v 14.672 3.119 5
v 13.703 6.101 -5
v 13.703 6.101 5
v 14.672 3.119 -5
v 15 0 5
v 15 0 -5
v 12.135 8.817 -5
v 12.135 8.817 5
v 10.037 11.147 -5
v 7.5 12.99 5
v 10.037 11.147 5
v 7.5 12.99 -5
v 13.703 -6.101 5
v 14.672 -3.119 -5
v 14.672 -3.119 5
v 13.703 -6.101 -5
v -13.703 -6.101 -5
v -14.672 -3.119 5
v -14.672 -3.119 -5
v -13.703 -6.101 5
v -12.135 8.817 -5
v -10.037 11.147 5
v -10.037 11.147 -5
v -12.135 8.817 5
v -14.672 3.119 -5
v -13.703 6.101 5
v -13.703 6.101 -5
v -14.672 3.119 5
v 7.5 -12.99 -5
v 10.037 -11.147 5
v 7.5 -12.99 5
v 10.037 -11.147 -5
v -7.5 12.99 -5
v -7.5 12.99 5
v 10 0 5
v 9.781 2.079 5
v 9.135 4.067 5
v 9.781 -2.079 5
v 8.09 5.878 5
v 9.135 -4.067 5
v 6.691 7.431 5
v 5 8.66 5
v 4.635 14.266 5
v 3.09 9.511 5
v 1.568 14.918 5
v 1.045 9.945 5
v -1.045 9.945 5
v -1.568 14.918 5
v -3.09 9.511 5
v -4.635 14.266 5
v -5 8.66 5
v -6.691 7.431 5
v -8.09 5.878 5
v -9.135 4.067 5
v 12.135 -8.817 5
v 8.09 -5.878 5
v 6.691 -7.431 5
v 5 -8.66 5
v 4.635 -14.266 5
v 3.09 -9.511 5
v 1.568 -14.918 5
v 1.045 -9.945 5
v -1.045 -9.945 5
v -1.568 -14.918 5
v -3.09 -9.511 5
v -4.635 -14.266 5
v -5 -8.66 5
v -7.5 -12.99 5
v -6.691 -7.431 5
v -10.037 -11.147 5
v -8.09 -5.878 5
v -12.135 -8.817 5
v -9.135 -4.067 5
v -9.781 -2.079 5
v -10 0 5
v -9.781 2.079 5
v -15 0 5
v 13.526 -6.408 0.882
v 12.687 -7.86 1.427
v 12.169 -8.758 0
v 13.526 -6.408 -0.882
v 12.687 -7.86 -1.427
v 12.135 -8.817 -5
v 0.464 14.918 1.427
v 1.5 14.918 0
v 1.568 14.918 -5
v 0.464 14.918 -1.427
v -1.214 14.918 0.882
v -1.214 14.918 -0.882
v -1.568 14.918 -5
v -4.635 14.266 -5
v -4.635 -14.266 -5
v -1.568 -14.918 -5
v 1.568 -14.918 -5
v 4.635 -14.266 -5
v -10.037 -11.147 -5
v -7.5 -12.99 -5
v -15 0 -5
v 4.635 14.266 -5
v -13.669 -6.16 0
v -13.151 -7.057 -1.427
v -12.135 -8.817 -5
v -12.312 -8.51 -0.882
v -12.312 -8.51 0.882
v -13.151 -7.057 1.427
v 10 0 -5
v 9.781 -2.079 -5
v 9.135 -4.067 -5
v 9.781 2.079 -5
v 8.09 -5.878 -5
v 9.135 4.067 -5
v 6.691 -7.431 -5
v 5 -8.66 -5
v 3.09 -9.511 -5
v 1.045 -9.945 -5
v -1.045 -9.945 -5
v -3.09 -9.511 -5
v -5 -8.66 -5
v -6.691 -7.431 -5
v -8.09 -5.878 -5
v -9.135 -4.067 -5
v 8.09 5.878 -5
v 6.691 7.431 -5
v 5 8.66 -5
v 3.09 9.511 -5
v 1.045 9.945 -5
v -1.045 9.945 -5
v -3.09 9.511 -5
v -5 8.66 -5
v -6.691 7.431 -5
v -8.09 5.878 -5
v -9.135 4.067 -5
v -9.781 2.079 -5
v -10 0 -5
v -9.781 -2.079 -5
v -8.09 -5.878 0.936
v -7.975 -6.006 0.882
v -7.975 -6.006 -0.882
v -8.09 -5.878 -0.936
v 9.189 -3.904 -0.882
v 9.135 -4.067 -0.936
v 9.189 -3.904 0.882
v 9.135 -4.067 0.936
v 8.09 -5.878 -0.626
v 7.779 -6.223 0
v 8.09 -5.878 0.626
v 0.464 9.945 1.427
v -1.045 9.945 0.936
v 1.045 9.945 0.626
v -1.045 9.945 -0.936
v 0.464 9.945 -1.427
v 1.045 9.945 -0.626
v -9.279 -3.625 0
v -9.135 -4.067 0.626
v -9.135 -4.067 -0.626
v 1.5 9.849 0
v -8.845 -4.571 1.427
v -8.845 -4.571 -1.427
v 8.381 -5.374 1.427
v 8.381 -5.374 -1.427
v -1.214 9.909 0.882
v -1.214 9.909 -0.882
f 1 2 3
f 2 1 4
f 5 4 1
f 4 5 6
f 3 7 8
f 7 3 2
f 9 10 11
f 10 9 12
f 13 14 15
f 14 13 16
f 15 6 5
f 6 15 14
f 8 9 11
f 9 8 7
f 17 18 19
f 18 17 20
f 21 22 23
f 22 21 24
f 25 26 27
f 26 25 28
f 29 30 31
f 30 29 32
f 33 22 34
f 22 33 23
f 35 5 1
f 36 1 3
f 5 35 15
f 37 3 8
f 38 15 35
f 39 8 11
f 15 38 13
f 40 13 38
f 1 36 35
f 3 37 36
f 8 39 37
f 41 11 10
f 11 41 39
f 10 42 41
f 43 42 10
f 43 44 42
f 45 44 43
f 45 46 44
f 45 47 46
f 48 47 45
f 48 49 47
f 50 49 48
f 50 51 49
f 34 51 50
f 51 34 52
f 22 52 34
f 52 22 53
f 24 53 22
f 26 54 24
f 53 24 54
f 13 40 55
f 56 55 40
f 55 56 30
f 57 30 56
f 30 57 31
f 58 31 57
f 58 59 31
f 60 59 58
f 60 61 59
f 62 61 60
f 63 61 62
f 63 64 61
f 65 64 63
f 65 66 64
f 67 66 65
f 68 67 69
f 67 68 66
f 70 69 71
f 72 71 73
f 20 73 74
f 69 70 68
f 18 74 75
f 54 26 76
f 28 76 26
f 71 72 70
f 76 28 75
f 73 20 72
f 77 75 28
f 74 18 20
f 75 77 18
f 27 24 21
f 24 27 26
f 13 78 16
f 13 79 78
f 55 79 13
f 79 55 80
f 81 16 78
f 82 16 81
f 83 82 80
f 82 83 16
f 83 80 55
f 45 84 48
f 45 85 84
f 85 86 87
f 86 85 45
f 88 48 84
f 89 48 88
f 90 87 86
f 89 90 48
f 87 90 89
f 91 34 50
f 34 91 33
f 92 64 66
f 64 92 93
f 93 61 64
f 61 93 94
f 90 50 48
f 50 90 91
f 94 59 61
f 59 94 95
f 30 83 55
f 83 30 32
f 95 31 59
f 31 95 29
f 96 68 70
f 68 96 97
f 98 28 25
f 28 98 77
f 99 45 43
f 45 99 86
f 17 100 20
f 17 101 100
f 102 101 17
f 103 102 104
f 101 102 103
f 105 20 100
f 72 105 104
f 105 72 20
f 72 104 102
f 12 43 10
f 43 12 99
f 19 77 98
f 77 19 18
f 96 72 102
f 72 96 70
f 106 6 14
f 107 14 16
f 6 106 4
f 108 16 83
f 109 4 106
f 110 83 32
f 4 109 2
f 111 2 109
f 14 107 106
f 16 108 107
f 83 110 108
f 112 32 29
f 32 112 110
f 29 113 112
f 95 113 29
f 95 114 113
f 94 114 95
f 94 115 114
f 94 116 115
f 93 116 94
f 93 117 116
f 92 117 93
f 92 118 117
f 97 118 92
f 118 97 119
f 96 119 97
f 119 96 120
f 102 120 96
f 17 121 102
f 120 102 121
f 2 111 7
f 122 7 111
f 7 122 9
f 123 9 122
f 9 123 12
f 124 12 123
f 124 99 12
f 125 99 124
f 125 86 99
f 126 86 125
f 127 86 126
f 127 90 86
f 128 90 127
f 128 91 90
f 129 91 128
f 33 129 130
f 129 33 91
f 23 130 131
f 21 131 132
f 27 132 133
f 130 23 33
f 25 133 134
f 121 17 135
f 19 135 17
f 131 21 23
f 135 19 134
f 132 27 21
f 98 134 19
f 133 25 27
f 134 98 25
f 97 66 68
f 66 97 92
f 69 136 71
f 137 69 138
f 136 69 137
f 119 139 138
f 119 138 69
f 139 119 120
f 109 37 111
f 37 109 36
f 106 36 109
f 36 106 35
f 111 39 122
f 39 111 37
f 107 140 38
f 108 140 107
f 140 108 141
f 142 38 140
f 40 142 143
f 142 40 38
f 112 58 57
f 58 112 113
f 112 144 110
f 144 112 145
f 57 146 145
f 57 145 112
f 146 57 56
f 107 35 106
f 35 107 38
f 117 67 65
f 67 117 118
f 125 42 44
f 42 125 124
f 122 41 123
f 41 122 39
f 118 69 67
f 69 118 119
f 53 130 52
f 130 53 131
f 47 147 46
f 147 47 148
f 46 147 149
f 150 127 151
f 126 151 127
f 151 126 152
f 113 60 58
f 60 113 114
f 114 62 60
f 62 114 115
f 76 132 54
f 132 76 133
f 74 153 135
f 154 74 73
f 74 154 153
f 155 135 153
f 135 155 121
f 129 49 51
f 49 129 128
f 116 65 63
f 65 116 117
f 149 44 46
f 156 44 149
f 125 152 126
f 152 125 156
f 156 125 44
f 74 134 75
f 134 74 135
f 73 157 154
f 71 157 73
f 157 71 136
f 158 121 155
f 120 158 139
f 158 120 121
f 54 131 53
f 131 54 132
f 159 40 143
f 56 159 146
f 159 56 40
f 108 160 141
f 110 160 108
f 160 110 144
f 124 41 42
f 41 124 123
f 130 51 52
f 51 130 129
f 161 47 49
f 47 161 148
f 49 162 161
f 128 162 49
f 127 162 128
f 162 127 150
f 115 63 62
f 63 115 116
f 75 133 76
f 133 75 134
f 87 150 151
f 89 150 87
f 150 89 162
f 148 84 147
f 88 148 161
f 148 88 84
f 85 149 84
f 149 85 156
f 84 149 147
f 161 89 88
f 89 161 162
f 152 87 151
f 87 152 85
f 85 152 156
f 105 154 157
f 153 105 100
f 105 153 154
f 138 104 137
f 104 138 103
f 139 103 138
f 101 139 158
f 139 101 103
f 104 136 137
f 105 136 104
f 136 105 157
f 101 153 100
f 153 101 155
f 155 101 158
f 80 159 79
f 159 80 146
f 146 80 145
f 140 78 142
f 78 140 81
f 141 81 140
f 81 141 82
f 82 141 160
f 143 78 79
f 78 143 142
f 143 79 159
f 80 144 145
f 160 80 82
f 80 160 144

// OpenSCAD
//bearing 51104 dimensions 20-35-10

difference(){
	cylinder(r=15,h=10,center=true);
	cylinder(r=10,h=11,center=true);
translate([0,12,0])rotate([90,0,0])cylinder(r=1.5,h=10,center=true);
rotate([0,0,120])translate([0,12,0])rotate([90,0,0])cylinder(r=1.5,h=10,center=true);
rotate([0,0,-120])translate([0,12,0])rotate([90,0,0])cylinder(r=1.5,h=10,center=true);
}
